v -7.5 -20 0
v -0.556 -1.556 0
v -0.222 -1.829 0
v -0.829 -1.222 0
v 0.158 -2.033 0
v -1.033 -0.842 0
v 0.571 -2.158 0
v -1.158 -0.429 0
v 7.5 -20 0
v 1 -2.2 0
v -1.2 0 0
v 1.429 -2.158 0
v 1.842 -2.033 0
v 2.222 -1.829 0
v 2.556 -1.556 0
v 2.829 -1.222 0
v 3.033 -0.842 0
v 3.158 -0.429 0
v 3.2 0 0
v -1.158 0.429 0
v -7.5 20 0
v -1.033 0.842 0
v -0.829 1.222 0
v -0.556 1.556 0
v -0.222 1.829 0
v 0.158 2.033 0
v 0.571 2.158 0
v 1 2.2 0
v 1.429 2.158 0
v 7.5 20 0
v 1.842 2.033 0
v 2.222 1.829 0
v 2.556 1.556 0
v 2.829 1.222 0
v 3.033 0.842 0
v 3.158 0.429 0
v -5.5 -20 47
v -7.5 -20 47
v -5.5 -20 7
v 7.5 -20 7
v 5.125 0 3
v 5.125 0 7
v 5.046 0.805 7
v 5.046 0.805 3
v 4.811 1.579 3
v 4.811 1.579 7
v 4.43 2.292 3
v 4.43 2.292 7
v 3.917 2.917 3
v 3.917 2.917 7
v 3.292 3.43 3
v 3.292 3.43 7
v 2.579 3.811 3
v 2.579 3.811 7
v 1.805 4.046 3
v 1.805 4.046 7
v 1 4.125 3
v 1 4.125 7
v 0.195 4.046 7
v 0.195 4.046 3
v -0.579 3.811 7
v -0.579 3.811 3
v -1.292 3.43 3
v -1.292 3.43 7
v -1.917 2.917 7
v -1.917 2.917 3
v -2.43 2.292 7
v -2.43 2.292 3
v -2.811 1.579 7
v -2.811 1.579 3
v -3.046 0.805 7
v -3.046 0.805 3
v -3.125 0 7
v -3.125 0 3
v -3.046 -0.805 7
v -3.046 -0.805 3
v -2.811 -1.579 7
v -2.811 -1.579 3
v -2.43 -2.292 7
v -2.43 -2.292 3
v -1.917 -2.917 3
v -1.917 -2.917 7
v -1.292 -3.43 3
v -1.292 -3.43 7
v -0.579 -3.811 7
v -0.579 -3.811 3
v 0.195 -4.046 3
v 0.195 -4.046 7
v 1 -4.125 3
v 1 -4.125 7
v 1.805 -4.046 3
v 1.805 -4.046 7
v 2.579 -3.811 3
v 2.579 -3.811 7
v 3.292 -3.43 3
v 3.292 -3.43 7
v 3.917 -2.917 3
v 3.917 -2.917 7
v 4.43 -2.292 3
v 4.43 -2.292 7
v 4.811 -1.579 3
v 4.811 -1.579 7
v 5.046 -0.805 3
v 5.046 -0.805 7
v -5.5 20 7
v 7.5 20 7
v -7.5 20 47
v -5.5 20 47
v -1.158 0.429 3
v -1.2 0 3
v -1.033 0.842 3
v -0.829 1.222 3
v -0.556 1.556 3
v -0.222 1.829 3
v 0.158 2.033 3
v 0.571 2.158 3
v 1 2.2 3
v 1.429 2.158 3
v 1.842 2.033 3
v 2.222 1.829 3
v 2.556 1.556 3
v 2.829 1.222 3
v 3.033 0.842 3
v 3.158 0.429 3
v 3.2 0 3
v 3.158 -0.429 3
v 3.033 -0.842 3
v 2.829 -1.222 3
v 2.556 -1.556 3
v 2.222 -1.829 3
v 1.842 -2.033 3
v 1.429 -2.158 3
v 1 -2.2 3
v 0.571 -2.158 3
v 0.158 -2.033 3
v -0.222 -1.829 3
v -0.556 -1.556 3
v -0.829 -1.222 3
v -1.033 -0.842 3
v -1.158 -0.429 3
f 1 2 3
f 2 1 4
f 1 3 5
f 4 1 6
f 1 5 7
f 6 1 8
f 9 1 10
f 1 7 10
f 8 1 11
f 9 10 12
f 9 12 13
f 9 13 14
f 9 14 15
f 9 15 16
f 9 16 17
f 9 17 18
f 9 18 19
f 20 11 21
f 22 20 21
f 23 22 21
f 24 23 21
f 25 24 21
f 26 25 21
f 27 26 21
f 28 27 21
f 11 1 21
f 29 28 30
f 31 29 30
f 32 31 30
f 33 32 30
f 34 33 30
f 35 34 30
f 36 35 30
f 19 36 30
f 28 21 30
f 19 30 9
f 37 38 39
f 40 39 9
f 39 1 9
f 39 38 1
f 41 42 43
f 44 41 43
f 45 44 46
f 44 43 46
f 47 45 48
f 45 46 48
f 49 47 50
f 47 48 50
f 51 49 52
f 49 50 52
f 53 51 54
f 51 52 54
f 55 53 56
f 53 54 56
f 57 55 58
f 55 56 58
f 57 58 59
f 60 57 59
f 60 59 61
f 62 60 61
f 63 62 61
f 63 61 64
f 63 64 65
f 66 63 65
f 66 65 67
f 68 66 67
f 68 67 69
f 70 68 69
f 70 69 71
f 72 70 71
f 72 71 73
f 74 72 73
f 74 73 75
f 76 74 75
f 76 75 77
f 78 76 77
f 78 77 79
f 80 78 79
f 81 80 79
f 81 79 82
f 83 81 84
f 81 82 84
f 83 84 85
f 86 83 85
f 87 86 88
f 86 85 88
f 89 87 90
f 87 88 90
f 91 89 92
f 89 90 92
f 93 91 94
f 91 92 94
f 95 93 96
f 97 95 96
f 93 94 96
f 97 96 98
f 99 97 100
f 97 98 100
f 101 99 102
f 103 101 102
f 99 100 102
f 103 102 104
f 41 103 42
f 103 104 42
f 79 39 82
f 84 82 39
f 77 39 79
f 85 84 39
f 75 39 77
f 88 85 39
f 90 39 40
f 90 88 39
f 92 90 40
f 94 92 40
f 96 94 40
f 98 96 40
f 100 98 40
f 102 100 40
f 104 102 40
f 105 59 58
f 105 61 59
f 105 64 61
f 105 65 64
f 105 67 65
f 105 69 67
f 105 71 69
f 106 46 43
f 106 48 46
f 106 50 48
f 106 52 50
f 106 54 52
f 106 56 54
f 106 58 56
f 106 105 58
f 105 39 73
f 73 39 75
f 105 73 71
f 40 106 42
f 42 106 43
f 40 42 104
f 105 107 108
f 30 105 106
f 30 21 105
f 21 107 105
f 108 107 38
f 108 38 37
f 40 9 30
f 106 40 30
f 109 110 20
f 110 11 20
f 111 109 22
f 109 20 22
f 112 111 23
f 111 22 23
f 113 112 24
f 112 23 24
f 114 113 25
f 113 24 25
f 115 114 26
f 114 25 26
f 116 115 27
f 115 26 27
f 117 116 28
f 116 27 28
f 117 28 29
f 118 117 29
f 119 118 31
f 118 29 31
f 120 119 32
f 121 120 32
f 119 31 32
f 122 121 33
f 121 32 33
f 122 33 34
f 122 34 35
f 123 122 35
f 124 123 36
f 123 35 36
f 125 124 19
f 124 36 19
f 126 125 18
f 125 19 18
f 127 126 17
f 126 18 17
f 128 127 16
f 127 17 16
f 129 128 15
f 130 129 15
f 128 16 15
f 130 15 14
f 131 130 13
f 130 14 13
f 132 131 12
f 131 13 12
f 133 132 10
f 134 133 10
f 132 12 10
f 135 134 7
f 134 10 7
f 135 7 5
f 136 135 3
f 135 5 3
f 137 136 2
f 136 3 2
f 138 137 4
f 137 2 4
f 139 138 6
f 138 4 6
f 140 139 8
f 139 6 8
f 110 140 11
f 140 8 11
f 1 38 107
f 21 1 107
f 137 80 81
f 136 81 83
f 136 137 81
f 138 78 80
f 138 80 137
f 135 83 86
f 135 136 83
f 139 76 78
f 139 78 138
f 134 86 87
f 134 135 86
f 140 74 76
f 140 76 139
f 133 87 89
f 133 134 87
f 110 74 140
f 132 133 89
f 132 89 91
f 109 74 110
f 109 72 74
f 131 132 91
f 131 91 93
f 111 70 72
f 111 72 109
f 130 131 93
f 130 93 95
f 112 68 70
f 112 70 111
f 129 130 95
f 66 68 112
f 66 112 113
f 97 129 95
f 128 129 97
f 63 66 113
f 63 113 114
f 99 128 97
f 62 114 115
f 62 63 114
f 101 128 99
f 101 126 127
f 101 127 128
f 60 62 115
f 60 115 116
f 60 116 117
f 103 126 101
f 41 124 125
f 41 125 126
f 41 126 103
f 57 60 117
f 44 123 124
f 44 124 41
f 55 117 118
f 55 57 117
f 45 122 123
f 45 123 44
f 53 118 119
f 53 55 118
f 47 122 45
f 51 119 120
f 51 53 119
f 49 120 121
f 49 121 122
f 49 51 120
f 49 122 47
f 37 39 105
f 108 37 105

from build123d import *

# Parameters (mm, degrees)
F0_W           = 15
F0_H           = 40
F1_DEPTH       = 7
F2_W           = 2
F2_H           = 40
F3_DEPTH       = 40
F5_D           = 4.4
F5_CBORE_D     = 8.25
F5_CBORE_DEPTH = 4


with BuildPart() as f1:
    # F0 (on Top) → F1 (new body)
    with BuildSketch(Plane.XY):
        Rectangle(F0_W, F0_H)
    extrude(amount=F1_DEPTH)

    # F2 (on face) → F3 (join)
    with BuildSketch(Plane.XY.offset(7)):
        with Locations((-6.5, 0)):
            Rectangle(F2_W, F2_H)
    extrude(amount=F3_DEPTH)

    # F5 (through all)
    with Locations(Plane.XY.offset(7)):
        with Locations((1, 0)):
            CounterBoreHole(F5_D / 2, F5_CBORE_D / 2, F5_CBORE_DEPTH)


solid = f1.part
